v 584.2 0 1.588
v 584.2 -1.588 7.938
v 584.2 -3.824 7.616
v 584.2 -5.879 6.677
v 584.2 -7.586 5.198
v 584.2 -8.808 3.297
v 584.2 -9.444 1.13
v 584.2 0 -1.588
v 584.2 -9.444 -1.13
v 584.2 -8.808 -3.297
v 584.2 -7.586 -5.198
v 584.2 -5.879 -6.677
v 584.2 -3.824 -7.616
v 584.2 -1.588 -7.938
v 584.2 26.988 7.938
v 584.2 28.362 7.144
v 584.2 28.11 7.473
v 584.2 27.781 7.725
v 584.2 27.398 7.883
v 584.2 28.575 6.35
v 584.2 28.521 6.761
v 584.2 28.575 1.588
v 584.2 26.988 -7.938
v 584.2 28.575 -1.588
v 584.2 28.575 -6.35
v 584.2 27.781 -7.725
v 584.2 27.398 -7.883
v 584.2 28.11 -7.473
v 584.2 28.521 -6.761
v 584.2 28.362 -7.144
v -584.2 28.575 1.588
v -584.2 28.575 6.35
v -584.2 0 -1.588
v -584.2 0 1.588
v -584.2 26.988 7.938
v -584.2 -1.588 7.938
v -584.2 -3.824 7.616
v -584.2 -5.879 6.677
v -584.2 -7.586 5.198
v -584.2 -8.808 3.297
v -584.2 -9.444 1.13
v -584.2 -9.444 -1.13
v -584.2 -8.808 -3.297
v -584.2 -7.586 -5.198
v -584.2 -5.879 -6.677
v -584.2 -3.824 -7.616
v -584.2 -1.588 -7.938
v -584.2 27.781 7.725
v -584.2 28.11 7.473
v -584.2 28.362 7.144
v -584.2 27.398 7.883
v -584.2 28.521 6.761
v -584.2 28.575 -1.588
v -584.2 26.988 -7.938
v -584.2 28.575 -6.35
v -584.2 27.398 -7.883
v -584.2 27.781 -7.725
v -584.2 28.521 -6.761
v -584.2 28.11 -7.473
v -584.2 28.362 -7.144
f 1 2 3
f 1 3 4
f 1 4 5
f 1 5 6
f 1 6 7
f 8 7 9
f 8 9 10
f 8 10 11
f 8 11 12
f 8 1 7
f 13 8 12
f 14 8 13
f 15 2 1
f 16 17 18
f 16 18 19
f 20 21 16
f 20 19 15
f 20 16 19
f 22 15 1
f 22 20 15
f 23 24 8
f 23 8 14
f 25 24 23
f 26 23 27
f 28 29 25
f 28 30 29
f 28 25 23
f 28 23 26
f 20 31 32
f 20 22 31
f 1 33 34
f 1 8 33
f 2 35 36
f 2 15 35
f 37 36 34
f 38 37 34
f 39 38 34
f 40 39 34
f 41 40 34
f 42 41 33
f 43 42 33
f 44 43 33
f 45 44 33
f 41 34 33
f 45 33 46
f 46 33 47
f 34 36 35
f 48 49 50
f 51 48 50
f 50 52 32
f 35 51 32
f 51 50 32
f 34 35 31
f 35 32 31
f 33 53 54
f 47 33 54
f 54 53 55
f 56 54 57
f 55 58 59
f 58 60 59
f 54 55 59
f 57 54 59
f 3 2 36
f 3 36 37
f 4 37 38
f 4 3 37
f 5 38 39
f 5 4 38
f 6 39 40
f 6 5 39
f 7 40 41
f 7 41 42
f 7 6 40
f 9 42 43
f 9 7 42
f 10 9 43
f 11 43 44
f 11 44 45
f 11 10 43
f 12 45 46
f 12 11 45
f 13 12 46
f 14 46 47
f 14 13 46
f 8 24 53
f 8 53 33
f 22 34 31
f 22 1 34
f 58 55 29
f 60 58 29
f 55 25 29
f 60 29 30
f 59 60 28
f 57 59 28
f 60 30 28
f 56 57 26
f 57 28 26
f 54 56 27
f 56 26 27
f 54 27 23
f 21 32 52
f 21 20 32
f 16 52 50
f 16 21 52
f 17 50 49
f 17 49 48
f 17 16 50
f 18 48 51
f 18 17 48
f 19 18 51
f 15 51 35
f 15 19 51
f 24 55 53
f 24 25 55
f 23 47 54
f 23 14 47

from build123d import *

# Parameters (mm, degrees)
BOSS_EXTRUDE1_DEPTH = 584.2
FILLET1_R           = 1.5875


with BuildPart() as part:
    # Sketch1 → Boss-Extrude1 (new body, symmetric)
    with BuildSketch(Plane(origin=(0, 0, 0), x_dir=(0, 0, -1), z_dir=(1, 0, 0))):
        with BuildLine():
            Line((-1.5875, 28.575), (-7.9375, 28.575))
            Line((-7.9375, 28.575), (-7.9375, -1.5875))
            ThreePointArc((-7.9375, -1.5875), (0, -9.525), (7.9375, -1.5875))
            Line((7.9375, -1.5875), (7.9375, 28.575))
            Line((7.9375, 28.575), (1.5875, 28.575))
            Line((1.5875, 28.575), (1.5875, 0))
            Line((1.5875, 0), (-1.5875, 0))
            Line((-1.5875, 0), (-1.5875, 28.575))
        make_face()
    extrude(amount=BOSS_EXTRUDE1_DEPTH, both=True)

    # Fillet1
    fillet1_edges = [part.edges().sort_by_distance(p)[0] for p in [
        (0, 28.575, -7.9375),
        (0, 28.575, 7.9375),
    ]]
    fillet(fillet1_edges, radius=FILLET1_R)


solid = part.part
